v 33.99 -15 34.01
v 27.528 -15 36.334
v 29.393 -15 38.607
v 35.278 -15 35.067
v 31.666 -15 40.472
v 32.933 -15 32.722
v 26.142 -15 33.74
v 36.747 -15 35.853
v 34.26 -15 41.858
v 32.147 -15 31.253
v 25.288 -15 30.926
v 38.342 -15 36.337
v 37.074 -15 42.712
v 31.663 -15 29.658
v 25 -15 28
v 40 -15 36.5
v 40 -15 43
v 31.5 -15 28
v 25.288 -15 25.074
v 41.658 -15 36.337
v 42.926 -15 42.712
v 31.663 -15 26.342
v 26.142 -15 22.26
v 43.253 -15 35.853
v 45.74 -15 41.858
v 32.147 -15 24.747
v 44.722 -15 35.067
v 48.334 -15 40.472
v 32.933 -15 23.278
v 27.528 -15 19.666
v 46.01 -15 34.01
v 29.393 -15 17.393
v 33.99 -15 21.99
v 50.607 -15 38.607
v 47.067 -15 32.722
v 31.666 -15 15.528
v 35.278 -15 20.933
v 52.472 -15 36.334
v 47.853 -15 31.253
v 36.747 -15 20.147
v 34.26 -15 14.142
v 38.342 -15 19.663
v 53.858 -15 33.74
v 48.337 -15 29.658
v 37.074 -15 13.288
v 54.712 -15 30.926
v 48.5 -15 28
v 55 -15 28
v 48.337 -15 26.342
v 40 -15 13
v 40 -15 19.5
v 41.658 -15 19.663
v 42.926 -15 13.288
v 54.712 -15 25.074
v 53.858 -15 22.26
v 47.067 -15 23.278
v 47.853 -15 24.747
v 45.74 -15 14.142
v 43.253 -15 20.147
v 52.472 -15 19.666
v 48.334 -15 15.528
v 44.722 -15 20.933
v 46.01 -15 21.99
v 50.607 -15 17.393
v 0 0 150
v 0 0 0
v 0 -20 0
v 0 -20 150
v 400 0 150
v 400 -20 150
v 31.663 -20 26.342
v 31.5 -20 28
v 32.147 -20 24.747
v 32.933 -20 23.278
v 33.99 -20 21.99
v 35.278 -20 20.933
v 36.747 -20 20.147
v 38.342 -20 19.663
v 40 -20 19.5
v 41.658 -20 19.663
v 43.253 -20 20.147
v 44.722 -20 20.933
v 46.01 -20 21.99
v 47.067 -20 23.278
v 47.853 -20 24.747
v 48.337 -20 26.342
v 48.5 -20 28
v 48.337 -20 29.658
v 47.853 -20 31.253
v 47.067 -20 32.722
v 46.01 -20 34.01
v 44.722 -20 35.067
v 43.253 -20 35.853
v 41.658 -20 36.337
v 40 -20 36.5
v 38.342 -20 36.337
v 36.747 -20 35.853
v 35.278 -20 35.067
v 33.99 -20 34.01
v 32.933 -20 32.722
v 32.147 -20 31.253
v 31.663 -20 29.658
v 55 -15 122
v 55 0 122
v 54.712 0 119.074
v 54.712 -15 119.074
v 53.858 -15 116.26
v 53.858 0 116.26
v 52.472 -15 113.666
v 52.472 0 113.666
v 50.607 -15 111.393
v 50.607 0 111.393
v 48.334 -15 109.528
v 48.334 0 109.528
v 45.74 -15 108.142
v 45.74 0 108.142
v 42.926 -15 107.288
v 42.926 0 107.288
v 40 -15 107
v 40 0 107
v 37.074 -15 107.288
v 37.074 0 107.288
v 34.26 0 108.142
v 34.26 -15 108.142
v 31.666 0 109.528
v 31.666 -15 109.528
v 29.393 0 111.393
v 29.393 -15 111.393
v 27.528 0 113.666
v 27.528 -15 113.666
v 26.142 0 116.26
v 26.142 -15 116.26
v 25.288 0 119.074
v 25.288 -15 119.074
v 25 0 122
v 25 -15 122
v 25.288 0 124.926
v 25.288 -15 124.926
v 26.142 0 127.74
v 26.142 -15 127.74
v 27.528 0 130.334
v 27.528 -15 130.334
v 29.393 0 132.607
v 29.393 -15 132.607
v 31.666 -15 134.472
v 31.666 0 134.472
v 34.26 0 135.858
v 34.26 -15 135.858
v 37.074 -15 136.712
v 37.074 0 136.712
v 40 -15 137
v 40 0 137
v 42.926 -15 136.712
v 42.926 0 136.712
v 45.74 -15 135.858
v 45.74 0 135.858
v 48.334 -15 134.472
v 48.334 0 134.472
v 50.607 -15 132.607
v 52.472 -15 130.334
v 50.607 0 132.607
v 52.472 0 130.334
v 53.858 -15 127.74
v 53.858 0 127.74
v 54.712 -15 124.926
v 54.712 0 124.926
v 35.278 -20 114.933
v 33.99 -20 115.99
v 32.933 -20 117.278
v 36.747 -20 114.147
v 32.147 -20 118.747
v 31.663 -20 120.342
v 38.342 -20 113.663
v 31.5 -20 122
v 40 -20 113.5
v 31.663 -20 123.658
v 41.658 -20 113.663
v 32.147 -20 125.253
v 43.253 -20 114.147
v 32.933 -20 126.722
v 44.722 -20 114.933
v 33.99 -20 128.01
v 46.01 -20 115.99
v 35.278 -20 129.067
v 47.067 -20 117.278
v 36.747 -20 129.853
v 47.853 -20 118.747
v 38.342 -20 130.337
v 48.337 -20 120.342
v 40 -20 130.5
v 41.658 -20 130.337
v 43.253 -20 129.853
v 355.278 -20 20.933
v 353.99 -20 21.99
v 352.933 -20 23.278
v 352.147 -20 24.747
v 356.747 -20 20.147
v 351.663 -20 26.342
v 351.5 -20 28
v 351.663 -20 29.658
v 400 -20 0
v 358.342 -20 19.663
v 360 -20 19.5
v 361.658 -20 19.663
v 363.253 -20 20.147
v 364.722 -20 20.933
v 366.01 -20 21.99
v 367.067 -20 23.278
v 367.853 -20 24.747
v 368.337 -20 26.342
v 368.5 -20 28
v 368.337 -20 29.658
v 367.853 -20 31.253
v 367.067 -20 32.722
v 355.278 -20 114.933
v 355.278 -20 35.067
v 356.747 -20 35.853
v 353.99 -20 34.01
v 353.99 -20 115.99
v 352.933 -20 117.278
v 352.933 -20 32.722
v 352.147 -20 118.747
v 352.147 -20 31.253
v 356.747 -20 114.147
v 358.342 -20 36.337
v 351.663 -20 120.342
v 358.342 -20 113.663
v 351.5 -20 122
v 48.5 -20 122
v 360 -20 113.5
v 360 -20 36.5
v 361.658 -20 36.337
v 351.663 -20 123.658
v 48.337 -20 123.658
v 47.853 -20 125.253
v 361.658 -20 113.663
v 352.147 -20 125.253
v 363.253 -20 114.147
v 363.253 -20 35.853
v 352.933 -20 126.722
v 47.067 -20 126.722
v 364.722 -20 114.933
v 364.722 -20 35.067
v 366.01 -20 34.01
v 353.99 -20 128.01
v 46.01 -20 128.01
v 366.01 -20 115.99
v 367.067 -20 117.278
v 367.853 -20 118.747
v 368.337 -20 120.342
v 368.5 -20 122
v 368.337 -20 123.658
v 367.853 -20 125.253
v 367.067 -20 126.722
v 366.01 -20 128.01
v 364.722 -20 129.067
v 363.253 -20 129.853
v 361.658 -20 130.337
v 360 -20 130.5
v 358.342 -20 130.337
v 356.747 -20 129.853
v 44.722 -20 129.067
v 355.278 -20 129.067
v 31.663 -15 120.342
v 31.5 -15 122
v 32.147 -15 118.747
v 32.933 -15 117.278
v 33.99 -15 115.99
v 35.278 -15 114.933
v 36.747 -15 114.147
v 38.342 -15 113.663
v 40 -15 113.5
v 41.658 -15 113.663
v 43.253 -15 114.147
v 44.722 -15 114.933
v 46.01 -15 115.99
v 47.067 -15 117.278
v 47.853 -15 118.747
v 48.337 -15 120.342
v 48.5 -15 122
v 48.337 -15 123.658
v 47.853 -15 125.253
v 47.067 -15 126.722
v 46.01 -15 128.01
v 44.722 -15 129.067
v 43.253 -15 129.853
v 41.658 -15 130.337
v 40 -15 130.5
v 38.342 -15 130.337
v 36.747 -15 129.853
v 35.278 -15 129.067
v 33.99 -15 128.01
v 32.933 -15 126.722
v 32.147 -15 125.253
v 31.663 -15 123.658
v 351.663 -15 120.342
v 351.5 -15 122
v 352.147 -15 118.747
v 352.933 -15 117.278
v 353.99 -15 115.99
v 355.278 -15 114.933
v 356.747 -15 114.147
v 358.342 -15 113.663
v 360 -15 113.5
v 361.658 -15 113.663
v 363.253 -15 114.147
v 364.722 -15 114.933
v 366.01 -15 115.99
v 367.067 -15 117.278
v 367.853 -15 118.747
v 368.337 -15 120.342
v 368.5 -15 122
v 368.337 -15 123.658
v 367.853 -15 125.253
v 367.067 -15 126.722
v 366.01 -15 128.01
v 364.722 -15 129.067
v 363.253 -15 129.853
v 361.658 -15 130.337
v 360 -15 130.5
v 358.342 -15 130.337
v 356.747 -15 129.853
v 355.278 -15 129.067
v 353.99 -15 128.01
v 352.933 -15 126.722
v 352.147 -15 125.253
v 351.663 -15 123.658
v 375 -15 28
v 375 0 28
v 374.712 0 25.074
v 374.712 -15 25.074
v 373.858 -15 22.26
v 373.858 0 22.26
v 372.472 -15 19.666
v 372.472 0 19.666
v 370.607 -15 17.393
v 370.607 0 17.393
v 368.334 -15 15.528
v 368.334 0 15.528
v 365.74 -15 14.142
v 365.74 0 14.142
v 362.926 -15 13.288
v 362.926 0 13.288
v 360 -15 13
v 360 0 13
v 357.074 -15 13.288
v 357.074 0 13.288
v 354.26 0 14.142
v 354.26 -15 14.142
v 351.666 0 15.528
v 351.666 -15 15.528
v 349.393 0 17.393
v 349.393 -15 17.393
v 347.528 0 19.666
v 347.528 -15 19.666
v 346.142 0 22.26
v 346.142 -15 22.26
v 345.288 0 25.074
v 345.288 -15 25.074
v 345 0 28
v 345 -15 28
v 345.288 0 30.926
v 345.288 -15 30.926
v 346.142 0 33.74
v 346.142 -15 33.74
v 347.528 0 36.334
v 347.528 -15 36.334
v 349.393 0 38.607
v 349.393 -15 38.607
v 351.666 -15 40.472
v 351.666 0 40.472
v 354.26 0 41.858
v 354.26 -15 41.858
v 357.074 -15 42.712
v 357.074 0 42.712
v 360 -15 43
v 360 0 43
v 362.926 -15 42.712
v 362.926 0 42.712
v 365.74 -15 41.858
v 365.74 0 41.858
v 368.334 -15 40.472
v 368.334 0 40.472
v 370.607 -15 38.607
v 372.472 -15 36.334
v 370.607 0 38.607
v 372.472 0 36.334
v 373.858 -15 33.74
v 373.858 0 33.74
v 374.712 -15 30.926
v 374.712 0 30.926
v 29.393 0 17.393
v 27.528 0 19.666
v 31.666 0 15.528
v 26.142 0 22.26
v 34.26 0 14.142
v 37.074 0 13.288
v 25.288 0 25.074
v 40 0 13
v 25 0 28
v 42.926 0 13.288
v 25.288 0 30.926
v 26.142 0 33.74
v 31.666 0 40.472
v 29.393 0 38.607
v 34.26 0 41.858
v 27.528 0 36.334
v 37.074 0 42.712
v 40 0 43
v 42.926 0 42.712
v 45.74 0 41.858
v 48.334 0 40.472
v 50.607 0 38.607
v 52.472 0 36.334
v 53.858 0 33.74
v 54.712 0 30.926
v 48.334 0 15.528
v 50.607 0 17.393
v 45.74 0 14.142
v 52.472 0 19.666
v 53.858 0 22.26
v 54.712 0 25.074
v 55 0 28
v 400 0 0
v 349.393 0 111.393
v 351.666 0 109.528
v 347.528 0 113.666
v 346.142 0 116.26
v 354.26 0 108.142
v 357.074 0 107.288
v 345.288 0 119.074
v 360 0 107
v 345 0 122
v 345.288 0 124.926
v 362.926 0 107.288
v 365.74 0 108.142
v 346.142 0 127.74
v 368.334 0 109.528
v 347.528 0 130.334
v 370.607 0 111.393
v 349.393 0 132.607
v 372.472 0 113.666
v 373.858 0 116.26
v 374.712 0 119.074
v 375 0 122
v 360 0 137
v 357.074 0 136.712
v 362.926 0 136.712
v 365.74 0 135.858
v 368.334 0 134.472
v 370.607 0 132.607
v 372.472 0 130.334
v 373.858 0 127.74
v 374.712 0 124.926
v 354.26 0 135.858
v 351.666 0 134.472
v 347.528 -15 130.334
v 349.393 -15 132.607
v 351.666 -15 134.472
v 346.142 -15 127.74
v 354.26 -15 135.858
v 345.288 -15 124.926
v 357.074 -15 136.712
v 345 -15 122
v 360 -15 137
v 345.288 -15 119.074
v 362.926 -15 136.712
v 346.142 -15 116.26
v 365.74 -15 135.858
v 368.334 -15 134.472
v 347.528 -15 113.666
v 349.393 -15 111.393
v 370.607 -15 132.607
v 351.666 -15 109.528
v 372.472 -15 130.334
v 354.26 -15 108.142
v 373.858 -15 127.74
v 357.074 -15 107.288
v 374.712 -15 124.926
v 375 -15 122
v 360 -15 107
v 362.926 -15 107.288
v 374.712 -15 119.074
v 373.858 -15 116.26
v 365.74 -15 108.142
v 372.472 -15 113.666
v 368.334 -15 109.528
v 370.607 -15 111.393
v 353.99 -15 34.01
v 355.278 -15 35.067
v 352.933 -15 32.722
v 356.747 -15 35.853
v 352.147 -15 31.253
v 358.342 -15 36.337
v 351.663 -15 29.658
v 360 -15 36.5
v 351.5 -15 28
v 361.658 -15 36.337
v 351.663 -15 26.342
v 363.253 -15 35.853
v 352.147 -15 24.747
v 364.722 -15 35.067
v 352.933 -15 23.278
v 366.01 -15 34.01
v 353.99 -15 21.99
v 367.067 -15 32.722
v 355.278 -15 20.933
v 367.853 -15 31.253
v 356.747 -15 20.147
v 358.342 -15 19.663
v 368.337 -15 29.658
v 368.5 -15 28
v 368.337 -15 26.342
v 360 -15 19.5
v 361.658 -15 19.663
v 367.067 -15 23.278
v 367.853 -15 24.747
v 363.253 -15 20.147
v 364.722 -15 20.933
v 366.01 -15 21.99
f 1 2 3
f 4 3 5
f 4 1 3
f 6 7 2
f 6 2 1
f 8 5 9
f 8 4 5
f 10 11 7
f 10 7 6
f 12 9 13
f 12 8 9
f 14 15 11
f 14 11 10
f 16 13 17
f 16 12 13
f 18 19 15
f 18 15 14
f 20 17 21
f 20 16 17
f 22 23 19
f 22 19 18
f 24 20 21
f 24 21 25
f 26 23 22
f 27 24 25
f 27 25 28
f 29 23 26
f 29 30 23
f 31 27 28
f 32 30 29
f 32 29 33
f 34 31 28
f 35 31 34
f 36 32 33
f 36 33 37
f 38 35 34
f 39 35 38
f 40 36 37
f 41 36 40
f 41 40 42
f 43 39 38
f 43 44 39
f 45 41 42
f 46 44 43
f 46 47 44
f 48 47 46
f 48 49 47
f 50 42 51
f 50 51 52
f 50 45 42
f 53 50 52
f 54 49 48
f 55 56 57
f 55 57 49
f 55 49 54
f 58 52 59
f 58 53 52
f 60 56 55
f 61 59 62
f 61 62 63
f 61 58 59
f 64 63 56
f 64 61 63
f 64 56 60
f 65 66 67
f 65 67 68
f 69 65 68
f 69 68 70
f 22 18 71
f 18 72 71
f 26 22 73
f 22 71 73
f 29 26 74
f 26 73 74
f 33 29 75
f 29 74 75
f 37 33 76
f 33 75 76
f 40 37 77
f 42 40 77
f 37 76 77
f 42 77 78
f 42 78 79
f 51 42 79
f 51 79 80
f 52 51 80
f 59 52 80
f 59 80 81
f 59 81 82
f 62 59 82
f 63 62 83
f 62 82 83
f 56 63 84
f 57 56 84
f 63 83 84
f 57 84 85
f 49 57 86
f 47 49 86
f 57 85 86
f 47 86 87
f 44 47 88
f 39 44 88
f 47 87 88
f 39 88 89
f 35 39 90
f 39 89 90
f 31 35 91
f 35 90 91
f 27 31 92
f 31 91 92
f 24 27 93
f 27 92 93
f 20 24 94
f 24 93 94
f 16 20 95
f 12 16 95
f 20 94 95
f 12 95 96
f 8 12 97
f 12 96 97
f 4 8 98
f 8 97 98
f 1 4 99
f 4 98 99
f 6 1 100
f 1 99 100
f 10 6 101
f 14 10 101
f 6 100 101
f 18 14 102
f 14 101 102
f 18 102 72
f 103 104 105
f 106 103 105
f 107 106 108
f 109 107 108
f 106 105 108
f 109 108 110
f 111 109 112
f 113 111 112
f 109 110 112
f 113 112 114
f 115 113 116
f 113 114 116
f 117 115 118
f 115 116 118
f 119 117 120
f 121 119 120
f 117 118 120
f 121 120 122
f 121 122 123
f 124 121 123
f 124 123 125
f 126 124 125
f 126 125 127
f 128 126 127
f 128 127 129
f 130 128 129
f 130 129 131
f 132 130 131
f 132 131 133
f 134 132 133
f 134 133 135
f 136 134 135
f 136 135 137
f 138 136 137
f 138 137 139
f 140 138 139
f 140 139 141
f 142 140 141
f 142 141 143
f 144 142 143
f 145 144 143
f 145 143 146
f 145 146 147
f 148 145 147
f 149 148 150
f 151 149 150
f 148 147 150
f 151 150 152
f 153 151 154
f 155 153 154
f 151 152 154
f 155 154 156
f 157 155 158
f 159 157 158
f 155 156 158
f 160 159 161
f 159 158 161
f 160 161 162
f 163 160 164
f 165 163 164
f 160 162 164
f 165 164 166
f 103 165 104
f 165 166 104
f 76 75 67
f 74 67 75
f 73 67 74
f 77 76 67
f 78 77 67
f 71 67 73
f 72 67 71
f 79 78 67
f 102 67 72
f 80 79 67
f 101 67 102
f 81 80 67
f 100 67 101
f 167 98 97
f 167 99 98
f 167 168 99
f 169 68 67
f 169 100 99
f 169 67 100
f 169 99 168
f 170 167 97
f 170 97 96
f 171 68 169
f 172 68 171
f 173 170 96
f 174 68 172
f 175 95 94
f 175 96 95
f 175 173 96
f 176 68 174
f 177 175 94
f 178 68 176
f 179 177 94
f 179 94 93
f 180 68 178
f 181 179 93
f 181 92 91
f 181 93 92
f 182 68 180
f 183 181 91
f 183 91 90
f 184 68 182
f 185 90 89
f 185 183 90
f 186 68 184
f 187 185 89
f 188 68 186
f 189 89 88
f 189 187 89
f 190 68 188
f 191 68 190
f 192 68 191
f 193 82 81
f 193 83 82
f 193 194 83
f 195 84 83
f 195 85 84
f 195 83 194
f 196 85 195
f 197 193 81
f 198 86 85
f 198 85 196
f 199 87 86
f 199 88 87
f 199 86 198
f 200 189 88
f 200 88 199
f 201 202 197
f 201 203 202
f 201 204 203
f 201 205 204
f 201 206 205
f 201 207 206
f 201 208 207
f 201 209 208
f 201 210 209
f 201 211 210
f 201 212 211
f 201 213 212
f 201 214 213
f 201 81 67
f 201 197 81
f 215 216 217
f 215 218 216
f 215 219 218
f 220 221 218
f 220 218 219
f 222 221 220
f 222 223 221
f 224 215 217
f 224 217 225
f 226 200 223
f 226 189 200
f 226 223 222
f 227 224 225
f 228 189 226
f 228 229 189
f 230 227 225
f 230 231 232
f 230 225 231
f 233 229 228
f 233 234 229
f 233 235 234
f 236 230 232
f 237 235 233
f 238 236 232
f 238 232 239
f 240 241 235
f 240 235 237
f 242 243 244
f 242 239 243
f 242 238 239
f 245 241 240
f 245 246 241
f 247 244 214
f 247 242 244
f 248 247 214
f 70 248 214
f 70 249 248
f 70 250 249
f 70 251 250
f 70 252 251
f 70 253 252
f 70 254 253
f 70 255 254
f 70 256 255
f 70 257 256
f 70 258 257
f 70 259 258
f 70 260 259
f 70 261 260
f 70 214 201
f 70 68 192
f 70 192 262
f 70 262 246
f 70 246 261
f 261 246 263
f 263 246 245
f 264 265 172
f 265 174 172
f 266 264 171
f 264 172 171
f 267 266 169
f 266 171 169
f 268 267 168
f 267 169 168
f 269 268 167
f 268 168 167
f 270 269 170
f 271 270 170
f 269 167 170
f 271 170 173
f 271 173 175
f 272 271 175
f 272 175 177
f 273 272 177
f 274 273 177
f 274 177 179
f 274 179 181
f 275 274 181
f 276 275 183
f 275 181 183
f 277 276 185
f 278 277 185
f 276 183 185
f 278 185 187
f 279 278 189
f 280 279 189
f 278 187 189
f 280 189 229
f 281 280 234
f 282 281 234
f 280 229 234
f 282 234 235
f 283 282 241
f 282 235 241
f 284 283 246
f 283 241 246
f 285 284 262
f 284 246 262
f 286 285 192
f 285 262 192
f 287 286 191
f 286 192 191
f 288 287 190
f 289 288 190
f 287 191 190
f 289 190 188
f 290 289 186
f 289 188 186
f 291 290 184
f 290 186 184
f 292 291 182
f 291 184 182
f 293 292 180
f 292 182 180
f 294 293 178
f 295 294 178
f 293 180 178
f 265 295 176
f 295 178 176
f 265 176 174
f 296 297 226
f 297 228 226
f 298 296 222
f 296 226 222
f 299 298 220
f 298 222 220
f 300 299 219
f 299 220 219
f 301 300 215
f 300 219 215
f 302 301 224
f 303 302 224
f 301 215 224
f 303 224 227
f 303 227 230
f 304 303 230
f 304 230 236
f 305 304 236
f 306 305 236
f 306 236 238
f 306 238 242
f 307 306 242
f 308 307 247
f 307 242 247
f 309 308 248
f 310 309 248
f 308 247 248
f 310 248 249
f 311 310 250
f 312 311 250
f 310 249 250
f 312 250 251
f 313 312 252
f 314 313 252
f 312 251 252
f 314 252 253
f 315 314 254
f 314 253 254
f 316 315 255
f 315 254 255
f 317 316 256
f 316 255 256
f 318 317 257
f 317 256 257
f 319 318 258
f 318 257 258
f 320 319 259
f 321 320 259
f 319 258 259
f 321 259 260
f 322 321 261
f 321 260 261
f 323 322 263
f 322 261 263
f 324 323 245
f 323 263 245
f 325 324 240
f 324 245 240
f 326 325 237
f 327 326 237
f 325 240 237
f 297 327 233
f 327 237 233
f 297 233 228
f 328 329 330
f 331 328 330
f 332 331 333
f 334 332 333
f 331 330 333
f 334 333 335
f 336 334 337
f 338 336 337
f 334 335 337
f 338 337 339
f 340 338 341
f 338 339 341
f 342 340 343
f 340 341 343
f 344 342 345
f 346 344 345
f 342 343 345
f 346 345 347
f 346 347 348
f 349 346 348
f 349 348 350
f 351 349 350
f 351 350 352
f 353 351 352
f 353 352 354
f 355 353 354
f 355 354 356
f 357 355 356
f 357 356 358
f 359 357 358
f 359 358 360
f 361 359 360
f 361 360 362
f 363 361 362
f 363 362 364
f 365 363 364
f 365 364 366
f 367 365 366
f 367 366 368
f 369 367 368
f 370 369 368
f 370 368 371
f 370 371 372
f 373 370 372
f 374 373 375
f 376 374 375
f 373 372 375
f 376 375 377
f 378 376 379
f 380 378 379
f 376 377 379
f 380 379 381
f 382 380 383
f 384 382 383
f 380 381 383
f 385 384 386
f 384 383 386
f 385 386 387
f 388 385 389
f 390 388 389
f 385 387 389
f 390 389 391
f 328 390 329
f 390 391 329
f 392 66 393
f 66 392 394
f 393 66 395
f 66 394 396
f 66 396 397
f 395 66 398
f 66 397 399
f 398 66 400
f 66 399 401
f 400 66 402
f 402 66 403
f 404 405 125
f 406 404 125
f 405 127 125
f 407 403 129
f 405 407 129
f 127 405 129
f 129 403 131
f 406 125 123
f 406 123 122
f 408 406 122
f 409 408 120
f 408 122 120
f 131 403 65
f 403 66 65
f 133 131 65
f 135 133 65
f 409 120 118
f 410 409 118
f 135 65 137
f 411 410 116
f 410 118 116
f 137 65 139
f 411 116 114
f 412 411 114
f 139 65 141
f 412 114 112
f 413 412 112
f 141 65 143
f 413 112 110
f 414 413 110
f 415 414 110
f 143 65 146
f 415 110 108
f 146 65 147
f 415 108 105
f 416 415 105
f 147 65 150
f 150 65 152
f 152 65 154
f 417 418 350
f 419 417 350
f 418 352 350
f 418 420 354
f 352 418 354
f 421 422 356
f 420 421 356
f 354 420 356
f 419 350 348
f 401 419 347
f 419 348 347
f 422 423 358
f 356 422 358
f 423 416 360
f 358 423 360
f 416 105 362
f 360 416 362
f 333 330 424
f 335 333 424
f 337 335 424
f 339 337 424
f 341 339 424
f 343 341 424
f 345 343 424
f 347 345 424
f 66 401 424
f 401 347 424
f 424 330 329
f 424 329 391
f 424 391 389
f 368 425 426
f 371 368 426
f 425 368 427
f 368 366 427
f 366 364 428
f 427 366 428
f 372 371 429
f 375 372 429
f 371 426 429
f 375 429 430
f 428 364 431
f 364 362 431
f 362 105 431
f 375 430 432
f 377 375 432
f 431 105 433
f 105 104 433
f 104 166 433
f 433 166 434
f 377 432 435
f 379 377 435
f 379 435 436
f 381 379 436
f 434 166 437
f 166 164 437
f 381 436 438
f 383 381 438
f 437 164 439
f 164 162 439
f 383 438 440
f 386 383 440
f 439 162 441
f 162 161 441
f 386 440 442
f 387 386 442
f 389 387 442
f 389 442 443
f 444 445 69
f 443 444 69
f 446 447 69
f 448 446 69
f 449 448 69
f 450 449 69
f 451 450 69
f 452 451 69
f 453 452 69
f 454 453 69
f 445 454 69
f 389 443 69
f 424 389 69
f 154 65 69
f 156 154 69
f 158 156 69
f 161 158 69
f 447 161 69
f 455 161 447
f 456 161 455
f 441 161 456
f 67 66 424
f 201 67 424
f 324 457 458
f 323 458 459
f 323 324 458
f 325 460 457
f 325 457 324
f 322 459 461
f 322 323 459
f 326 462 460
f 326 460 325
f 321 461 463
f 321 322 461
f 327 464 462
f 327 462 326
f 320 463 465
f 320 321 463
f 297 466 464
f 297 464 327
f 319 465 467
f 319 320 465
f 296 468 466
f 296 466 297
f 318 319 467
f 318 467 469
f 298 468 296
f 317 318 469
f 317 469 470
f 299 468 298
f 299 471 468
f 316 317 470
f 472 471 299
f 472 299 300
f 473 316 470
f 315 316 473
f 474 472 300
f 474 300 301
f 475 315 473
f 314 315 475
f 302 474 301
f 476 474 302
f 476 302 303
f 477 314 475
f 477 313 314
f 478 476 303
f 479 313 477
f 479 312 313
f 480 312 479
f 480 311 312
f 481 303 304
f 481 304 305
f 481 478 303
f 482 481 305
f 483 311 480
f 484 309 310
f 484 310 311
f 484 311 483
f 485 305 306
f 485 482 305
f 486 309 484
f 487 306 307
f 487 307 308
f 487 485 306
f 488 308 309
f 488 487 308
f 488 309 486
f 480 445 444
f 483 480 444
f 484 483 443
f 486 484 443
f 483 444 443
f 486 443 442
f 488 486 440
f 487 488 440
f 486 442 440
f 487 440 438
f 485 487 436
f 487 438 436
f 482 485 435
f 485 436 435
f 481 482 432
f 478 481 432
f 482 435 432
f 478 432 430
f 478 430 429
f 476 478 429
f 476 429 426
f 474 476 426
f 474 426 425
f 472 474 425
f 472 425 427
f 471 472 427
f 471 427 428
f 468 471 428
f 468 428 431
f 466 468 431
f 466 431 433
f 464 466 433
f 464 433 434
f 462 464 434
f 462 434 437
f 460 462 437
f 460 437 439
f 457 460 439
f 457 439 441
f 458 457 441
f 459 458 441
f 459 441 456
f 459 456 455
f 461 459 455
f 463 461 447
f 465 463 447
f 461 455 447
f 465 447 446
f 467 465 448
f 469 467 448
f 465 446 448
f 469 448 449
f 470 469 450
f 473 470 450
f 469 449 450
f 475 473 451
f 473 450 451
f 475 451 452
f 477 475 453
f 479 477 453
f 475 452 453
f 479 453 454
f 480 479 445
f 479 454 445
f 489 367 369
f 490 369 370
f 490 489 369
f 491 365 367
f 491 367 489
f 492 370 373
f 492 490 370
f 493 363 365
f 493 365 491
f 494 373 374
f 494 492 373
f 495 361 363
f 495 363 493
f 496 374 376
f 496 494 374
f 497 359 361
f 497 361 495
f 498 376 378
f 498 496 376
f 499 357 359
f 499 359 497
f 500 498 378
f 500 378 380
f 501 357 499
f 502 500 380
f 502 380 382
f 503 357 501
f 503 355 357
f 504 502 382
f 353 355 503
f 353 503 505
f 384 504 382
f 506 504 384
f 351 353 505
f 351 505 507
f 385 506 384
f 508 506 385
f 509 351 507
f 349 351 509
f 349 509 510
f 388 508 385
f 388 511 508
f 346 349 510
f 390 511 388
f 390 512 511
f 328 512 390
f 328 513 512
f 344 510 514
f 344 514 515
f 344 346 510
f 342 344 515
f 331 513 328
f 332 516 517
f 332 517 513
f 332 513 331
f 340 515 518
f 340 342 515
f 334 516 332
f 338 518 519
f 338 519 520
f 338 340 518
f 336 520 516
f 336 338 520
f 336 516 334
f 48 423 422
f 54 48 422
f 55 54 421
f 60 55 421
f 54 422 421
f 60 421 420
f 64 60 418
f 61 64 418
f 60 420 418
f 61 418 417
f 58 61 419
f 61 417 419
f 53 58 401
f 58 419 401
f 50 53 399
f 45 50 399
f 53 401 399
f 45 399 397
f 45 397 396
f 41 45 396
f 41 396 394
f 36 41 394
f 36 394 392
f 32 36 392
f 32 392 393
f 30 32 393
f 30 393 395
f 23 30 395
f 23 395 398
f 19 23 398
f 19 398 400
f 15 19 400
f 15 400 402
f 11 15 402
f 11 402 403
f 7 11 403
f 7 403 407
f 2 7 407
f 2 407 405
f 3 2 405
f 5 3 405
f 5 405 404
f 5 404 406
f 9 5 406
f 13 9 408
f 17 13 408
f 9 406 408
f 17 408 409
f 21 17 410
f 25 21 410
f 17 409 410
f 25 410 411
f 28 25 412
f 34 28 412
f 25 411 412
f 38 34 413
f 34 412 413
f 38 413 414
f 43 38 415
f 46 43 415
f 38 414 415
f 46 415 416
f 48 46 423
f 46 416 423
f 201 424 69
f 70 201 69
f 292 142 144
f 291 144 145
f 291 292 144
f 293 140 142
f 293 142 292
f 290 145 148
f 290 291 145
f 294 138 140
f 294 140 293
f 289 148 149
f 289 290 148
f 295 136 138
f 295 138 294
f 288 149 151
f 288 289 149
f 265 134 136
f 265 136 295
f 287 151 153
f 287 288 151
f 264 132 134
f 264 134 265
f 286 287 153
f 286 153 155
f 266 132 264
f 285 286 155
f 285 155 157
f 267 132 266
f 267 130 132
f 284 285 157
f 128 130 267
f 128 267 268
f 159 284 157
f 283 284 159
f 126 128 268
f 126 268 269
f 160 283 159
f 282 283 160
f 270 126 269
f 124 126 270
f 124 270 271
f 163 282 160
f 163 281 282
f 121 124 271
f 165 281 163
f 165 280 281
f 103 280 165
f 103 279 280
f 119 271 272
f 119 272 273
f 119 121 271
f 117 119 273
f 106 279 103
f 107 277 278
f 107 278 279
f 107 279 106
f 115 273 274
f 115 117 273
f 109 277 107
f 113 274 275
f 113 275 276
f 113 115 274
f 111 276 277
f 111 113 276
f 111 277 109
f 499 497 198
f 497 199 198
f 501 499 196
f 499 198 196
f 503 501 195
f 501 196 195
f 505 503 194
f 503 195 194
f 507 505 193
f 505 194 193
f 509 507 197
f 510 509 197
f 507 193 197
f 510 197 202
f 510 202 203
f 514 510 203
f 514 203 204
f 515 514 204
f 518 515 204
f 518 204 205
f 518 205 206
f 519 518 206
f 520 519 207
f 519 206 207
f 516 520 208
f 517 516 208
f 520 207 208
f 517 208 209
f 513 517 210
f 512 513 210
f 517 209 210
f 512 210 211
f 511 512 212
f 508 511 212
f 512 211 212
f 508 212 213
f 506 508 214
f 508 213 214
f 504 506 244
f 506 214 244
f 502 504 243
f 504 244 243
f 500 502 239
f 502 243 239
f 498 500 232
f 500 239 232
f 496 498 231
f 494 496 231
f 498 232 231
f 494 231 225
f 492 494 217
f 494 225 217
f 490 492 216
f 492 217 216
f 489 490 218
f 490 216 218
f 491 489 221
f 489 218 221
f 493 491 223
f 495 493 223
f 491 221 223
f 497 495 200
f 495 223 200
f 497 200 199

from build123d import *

# Parameters (mm, degrees)
F0_W           = 400
F0_H           = 150
F1_DEPTH       = 20
F2_D           = 17
F2_DEPTH       = 35
F2_CBORE_D     = 30
F2_CBORE_DEPTH = 15
F2_TIP         = 5.1073152617


with BuildPart() as f1:
    # F0 (on Front) → F1 (new body)
    with BuildSketch(Plane.XZ):
        with Locations((200, 75)):
            Rectangle(F0_W, F0_H)
    extrude(amount=F1_DEPTH)

    # F2
    with Locations(Plane(origin=(0, 0, 0), x_dir=(1, 0, 0), z_dir=(0, 1, 0))):
        with Locations((360, -122), (360, -28), (40, -122), (40, -28)):
            CounterBoreHole(F2_D / 2, F2_CBORE_D / 2, F2_CBORE_DEPTH, depth=F2_DEPTH)
            with Locations((0, 0, -(F2_DEPTH + F2_TIP / 2))):  # 118° drill point
                Cone(0, F2_D / 2, F2_TIP, mode=Mode.SUBTRACT)


solid = f1.part
